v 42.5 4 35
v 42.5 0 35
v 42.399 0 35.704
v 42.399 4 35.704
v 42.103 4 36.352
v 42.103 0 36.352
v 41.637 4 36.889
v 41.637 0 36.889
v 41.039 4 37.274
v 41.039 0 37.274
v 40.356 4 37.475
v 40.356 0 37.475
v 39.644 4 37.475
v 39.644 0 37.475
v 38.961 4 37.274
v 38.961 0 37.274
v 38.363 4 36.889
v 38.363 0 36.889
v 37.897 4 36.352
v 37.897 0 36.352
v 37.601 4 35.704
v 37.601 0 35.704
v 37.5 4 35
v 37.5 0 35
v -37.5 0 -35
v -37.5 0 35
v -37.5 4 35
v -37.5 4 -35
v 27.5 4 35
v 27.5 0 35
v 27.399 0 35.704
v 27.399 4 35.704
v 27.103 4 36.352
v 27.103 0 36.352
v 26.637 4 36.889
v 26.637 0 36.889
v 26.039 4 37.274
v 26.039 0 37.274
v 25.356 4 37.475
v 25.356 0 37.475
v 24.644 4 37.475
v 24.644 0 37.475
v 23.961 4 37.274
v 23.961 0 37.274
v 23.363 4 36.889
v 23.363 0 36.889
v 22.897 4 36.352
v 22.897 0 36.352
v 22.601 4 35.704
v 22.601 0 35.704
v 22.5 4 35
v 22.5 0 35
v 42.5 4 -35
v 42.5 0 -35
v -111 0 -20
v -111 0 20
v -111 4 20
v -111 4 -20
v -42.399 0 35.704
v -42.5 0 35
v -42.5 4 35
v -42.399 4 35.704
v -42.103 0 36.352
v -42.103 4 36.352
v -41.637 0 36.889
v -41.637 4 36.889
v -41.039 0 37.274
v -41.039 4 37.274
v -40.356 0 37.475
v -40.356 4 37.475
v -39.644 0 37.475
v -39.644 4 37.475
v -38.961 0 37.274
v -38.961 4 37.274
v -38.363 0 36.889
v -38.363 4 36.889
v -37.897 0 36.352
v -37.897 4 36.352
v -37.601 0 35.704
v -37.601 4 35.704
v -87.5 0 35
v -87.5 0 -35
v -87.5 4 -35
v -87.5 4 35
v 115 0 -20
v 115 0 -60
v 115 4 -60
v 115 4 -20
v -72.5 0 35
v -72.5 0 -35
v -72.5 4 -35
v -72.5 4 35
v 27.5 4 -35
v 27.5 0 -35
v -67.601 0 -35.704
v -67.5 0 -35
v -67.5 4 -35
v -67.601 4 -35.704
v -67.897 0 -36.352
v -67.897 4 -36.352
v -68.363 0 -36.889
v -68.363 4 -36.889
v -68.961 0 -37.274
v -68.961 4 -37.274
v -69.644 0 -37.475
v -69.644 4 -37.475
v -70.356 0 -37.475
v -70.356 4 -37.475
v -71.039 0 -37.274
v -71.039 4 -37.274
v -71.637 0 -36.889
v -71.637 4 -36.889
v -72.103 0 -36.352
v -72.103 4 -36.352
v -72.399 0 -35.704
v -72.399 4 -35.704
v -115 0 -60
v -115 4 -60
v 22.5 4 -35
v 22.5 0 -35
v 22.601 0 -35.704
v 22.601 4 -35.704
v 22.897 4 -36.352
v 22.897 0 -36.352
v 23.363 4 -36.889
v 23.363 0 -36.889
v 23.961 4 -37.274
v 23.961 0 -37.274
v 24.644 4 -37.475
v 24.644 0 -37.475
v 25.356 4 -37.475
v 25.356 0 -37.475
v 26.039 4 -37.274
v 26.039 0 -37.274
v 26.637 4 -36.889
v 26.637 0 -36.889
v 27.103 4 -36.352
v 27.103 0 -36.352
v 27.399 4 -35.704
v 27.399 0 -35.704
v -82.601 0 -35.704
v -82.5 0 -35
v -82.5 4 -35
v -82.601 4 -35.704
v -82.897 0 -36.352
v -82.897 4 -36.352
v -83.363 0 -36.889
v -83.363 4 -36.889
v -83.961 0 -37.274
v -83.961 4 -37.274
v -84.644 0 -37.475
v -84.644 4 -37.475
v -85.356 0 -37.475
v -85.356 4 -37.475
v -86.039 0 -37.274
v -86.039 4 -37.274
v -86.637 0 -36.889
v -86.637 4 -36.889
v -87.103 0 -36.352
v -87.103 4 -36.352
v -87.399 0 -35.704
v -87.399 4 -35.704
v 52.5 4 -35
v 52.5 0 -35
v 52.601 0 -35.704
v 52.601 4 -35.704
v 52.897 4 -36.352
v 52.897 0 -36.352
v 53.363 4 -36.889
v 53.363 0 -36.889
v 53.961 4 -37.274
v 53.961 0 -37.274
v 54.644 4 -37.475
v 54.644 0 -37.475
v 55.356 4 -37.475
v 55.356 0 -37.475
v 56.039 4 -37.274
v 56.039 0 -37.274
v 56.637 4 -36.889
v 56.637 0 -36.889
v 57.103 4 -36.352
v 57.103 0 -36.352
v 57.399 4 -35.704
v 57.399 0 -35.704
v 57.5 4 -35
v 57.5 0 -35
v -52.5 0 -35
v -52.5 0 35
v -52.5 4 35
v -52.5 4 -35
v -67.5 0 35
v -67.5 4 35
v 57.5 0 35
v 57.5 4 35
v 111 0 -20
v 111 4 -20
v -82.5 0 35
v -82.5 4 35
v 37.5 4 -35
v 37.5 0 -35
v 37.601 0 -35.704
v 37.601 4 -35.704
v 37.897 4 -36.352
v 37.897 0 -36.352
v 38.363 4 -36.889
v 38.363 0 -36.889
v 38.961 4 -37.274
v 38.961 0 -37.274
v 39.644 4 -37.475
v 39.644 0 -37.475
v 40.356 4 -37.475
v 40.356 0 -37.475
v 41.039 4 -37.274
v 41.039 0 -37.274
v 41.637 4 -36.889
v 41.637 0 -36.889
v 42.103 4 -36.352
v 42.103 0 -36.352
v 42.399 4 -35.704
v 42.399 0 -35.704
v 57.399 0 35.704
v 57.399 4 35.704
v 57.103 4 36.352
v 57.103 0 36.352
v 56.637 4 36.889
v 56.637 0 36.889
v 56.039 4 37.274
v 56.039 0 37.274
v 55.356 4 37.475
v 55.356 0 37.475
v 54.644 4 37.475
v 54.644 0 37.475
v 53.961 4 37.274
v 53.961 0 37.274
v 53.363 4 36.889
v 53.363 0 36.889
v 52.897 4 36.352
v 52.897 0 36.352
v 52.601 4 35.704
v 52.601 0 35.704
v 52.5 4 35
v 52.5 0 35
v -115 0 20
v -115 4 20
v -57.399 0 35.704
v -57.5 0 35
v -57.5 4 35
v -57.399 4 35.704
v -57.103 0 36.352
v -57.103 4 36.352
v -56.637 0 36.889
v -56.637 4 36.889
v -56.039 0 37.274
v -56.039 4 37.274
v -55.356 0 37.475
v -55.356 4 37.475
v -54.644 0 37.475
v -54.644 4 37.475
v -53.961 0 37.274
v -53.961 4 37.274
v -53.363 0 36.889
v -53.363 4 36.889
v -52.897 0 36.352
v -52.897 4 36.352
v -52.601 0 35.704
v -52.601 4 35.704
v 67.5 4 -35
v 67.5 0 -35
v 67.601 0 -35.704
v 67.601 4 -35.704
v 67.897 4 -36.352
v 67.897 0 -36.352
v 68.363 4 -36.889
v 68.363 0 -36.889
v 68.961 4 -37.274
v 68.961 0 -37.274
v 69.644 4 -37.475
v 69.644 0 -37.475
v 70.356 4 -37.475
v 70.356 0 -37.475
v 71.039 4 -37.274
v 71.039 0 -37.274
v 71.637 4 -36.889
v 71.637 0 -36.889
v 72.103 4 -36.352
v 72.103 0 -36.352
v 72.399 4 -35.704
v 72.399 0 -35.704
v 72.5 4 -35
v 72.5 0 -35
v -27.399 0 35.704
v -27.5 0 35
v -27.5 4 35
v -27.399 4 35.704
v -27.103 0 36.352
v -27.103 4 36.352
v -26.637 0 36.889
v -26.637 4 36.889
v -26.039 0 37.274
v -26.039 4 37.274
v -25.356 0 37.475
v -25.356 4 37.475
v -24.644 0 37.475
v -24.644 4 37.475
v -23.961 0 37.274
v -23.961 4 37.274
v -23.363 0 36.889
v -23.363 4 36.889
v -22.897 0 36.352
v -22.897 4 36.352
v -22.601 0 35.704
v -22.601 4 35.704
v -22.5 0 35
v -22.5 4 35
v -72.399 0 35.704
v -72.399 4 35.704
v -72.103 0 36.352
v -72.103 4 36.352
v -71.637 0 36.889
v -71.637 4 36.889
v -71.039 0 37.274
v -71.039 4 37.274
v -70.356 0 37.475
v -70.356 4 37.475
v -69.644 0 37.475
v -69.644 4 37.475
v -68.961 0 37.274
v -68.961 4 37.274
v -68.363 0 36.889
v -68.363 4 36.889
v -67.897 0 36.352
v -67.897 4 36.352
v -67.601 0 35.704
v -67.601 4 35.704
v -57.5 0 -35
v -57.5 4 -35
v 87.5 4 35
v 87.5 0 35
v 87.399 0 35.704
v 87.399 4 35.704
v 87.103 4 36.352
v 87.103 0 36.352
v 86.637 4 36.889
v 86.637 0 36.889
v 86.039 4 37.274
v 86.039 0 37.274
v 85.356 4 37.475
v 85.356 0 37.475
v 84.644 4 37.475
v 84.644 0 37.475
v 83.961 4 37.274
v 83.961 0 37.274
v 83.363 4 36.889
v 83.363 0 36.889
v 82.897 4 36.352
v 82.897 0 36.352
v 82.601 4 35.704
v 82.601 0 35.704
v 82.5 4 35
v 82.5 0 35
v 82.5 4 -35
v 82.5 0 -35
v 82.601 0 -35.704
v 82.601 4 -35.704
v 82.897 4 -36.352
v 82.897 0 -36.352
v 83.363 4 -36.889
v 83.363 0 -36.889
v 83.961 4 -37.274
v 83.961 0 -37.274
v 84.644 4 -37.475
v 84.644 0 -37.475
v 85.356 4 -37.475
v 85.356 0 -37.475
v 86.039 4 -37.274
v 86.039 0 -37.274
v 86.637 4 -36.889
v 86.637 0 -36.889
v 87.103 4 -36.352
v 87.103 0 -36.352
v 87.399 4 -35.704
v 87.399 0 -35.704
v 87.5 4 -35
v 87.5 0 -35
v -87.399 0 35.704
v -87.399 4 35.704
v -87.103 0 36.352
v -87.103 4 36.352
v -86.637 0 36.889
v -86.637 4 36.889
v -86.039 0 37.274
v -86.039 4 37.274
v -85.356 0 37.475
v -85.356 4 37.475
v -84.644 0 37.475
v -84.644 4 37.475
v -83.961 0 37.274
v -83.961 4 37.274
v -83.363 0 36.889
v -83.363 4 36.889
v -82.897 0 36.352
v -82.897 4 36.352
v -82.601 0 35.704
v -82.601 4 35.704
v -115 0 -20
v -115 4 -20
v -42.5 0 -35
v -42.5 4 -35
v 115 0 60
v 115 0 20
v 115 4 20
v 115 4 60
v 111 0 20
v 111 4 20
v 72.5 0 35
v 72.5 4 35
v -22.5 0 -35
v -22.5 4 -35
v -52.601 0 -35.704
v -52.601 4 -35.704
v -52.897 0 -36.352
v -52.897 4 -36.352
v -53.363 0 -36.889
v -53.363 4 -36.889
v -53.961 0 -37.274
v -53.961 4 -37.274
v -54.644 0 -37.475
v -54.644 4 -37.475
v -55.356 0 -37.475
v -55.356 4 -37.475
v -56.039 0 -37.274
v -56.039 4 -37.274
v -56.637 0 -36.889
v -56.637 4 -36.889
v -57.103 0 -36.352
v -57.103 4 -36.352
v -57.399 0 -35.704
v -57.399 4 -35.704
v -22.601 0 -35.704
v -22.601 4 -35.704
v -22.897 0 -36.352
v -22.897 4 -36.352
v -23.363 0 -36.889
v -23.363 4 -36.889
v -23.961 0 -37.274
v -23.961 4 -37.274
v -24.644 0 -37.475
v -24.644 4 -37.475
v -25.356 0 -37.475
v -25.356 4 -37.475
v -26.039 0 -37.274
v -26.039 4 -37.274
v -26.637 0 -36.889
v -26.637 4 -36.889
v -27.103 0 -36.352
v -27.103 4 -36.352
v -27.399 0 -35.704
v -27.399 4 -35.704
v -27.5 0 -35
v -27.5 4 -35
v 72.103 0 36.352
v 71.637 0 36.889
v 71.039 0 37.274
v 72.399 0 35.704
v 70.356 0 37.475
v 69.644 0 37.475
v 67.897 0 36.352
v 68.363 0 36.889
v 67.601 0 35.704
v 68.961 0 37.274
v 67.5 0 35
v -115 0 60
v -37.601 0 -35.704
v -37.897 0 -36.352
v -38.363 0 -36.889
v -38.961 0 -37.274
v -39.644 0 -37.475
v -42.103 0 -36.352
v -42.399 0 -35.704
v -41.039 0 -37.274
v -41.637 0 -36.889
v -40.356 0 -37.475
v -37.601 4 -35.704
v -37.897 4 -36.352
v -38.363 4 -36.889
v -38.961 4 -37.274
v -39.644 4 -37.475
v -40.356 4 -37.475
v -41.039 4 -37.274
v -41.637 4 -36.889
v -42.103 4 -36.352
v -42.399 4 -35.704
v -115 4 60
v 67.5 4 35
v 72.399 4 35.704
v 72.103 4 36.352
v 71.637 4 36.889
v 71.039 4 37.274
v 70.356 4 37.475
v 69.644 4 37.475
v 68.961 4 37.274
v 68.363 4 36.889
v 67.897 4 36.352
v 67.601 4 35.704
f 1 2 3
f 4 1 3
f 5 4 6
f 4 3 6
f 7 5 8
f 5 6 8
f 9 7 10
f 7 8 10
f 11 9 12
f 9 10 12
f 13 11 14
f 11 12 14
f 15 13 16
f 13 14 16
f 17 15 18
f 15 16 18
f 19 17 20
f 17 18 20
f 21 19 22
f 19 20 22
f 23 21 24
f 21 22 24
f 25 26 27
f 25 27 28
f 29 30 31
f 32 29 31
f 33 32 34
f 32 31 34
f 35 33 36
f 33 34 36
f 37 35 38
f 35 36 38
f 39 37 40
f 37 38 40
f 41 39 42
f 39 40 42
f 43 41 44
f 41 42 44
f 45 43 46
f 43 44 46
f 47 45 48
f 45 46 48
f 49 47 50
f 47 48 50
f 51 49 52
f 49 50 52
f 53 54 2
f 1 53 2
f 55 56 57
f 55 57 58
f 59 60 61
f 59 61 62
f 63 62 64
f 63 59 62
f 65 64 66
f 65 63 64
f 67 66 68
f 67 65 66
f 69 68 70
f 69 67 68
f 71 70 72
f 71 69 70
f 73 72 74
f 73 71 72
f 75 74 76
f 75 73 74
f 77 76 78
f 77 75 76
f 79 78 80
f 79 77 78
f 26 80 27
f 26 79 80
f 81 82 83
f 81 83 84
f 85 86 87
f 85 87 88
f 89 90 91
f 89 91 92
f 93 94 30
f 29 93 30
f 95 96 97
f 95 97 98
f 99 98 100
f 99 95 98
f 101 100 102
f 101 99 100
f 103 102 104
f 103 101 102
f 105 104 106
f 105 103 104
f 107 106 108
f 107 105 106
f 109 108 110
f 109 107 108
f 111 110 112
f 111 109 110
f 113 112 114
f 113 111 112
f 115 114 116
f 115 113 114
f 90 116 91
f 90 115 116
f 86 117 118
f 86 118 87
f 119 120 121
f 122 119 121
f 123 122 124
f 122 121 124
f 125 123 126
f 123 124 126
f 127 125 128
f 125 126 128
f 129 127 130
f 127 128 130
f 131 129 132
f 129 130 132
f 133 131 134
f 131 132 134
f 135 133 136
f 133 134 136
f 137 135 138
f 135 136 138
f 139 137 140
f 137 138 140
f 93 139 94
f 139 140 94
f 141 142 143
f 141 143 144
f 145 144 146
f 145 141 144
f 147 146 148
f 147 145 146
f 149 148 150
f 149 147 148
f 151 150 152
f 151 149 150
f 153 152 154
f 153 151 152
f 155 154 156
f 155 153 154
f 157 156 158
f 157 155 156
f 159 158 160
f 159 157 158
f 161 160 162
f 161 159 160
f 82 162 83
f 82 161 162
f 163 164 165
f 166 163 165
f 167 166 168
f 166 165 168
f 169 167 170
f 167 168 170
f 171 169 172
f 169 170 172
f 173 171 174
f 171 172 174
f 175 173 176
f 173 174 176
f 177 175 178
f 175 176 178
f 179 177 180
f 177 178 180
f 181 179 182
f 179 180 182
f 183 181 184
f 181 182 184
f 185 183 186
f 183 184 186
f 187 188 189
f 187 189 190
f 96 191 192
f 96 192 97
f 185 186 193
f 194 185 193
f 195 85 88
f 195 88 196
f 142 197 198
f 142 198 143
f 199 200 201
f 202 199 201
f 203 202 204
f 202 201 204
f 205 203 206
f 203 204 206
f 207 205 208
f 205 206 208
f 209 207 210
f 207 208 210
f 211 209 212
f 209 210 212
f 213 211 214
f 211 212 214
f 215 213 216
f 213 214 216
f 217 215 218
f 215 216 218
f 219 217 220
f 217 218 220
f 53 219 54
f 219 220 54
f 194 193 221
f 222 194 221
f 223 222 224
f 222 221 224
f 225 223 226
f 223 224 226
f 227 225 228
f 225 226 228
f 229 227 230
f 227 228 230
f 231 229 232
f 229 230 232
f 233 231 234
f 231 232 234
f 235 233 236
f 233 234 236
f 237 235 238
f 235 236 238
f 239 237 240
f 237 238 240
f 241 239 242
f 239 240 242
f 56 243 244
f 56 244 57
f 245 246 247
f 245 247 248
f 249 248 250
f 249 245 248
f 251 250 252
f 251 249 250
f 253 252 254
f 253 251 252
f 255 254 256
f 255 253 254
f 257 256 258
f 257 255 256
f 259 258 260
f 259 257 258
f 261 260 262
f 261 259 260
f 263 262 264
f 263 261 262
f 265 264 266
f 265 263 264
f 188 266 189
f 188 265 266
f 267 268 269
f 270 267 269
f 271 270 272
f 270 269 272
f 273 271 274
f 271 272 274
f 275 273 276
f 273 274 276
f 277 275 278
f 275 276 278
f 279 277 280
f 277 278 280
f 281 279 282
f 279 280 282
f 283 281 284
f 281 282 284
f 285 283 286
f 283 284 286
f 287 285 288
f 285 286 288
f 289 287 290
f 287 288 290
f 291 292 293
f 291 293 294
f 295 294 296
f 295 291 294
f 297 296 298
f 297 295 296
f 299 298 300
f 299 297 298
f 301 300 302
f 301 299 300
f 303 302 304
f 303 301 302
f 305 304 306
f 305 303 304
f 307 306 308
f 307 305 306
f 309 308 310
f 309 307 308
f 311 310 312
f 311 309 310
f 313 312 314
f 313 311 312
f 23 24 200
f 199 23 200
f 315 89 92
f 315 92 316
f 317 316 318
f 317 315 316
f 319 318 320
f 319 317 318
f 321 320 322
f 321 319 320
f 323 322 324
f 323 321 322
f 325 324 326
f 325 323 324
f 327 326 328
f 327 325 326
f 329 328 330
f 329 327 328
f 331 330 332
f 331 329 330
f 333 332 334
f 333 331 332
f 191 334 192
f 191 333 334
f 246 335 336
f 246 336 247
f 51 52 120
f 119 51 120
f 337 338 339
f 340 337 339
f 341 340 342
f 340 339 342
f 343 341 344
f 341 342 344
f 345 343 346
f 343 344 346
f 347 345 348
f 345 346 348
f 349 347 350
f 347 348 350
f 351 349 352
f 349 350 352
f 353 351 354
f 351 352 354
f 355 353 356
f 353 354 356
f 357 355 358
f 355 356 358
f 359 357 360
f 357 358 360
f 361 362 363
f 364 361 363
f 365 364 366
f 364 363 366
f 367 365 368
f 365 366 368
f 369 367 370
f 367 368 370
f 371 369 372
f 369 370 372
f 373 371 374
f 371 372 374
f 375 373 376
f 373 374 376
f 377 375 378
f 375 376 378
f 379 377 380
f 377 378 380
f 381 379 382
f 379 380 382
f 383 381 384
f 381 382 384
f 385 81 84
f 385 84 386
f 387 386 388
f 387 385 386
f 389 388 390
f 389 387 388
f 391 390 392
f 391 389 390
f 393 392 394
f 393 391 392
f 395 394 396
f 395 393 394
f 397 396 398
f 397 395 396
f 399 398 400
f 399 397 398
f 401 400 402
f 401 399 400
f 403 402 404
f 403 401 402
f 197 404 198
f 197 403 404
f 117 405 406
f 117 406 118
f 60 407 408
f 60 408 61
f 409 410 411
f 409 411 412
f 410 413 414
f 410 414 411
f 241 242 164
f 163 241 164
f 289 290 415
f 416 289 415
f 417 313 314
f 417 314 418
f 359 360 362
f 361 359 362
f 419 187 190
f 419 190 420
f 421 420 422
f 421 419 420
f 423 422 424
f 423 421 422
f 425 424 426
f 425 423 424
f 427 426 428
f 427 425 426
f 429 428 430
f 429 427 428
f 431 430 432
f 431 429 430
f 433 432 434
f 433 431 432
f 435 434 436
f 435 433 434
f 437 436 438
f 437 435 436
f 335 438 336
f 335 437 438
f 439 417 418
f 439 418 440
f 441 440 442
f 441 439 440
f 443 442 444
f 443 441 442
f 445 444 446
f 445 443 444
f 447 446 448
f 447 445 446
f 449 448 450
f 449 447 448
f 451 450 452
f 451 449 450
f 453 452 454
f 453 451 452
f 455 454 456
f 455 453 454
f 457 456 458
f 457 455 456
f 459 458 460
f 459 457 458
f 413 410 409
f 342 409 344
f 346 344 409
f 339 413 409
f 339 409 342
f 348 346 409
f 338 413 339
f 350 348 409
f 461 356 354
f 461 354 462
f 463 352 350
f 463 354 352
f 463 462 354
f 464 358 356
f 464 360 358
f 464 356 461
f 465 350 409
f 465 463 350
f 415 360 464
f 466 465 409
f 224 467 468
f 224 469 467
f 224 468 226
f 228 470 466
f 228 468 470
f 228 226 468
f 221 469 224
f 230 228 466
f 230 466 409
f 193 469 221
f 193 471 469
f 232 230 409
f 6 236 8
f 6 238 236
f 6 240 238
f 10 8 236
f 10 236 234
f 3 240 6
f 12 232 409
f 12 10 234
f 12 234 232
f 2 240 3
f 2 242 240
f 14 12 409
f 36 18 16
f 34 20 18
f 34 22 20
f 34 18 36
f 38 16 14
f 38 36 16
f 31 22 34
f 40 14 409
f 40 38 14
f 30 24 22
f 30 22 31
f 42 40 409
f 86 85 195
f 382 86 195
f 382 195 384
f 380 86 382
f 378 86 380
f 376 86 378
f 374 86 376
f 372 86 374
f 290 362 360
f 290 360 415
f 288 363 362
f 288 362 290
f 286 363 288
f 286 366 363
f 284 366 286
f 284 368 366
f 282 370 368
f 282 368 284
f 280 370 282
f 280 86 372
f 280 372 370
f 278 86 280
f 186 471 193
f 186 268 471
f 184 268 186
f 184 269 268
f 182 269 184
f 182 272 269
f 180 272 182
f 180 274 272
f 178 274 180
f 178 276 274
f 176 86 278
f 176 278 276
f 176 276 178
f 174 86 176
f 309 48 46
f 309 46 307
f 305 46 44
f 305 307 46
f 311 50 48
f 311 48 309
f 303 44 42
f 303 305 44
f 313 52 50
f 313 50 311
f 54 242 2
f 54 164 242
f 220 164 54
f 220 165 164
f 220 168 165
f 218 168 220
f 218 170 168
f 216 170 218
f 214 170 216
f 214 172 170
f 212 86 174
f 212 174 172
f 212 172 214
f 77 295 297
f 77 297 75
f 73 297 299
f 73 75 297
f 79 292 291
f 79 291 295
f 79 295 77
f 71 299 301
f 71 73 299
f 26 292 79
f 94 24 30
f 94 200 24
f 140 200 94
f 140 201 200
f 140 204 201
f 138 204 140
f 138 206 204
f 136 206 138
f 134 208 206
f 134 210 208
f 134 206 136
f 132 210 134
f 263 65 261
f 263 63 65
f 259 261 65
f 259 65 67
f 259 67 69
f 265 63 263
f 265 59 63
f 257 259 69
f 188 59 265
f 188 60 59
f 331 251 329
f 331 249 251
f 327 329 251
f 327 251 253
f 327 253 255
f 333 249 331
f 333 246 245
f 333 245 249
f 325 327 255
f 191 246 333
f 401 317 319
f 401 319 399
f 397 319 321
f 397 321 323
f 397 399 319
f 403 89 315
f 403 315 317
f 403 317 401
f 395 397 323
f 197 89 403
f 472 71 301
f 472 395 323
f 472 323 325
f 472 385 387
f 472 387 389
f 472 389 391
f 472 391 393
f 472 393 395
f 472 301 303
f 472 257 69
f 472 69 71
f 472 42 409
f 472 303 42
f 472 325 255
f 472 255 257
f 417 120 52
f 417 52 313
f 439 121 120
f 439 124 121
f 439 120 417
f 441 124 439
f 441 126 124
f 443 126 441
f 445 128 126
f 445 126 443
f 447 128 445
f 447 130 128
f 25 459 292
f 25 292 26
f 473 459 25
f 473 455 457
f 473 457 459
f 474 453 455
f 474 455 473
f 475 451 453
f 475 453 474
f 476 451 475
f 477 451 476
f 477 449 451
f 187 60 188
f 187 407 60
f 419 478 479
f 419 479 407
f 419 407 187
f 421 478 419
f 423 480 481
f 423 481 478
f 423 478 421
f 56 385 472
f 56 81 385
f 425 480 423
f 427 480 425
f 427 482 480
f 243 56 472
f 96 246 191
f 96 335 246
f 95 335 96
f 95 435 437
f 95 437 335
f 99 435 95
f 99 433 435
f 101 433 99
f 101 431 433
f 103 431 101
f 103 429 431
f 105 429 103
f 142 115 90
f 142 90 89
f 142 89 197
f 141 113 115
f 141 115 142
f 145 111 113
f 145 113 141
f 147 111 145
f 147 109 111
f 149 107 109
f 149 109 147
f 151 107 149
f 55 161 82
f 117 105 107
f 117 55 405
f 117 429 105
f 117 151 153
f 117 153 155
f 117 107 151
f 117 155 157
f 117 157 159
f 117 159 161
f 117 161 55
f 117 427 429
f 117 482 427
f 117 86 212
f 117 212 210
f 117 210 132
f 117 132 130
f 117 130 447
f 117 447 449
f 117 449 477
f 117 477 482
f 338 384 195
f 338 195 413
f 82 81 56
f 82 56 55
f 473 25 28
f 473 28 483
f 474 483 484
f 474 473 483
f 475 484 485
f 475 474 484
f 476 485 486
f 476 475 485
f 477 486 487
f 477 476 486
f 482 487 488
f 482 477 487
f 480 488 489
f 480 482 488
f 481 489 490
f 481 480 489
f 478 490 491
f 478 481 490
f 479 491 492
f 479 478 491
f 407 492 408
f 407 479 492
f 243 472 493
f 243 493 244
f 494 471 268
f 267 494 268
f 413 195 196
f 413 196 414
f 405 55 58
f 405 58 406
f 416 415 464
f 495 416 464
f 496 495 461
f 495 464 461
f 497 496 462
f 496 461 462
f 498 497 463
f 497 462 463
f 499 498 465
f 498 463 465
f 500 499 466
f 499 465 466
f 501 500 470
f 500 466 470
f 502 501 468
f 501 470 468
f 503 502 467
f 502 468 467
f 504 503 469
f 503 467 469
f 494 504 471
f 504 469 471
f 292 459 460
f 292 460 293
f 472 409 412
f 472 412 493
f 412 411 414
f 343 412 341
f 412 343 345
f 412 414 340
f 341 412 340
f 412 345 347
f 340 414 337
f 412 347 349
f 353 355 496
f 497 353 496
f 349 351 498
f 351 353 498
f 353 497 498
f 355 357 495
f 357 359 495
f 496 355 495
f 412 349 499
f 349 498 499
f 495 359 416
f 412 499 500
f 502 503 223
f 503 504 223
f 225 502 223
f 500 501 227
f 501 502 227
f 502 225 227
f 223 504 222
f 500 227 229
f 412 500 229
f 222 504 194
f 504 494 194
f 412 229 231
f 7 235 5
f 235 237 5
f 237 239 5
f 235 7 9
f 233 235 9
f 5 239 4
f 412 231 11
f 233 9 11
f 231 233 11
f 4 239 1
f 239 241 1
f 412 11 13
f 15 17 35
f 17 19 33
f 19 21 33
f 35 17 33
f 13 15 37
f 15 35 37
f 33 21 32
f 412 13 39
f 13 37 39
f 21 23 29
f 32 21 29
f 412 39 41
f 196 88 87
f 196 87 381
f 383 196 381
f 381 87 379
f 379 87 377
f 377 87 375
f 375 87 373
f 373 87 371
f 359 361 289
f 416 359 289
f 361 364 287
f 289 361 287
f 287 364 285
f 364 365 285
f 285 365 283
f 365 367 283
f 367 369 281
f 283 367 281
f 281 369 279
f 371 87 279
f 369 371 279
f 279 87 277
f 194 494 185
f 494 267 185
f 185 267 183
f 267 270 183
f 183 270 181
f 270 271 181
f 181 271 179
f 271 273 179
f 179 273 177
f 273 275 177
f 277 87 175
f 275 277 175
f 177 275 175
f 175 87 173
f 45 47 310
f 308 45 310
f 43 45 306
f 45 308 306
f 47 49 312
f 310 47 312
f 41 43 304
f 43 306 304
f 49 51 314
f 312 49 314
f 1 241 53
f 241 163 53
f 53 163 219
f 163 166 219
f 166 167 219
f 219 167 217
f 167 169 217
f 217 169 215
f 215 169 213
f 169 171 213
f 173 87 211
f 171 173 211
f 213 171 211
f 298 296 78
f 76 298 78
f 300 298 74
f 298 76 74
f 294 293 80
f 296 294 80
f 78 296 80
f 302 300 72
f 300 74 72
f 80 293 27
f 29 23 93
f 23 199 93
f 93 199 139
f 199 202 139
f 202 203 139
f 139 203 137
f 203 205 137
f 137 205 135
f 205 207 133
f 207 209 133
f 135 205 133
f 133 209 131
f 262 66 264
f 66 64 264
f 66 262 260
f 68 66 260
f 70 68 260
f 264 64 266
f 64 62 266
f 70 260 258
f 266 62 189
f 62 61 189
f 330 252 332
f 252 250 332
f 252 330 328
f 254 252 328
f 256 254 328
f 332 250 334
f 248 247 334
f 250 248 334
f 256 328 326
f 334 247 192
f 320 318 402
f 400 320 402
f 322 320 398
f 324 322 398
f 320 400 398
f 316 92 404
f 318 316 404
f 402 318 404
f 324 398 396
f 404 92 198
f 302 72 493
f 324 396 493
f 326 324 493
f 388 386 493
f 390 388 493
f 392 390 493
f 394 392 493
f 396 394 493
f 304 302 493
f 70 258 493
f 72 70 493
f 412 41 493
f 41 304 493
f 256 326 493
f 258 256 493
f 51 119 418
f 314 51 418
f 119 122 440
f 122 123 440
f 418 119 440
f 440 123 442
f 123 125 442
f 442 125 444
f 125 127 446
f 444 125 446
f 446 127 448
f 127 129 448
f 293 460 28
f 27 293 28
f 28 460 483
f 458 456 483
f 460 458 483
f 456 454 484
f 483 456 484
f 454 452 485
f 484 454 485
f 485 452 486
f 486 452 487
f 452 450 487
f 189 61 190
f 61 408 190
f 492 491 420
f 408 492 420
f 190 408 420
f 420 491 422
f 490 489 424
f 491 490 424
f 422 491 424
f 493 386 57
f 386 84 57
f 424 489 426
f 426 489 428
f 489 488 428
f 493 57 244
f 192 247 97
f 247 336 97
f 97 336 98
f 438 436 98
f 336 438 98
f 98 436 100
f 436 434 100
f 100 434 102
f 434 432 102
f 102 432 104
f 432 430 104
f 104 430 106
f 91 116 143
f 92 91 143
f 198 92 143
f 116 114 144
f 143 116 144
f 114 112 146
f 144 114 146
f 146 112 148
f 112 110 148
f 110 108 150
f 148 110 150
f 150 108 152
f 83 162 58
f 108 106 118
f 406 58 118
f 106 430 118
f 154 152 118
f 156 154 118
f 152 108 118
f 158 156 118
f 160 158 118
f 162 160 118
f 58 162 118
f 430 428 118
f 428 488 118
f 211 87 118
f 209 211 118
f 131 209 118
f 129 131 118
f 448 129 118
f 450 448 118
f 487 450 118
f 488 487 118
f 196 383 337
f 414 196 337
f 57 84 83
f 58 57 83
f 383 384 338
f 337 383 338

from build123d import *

# Parameters (mm, degrees)
BOSS_EXTRUDE1_DEPTH = 4
CUT_EXTRUDE1_DEPTH  = 4


with BuildPart() as part:
    # Sketch1 → Boss-Extrude1 (new body)
    with BuildSketch(Plane(origin=(0, 0, 0), x_dir=(1, 0, 0), z_dir=(0, 1, 0))):
        Polygon((-115, 60), (115, 60), (115, 20), (111, 20), (111, -20), (115, -20), (115, -60), (-115, -60), (-115, -20), (-111, -20), (-111, 20), (-115, 20), align=None)
    extrude(amount=BOSS_EXTRUDE1_DEPTH)

    # Sketch2 → Cut-Extrude1 (cut)
    with BuildSketch(Plane.XZ):
        with BuildLine():
            Line((-87.5, -35), (-87.5, 35))
            ThreePointArc((-87.5, 35), (-85, 37.5), (-82.5, 35))
            Line((-82.5, 35), (-82.5, -35))
            ThreePointArc((-82.5, -35), (-85, -37.5), (-87.5, -35))
        make_face()
        with BuildLine():
            Line((-72.5, -35), (-72.5, 35))
            ThreePointArc((-72.5, 35), (-70, 37.5), (-67.5, 35))
            Line((-67.5, 35), (-67.5, -35))
            ThreePointArc((-67.5, -35), (-70, -37.5), (-72.5, -35))
        make_face()
        with BuildLine():
            Line((-57.5, -35), (-57.5, 35))
            ThreePointArc((-57.5, 35), (-55, 37.5), (-52.5, 35))
            Line((-52.5, 35), (-52.5, -35))
            ThreePointArc((-52.5, -35), (-55, -37.5), (-57.5, -35))
        make_face()
        with BuildLine():
            Line((-42.5, -35), (-42.5, 35))
            ThreePointArc((-42.5, 35), (-40, 37.5), (-37.5, 35))
            Line((-37.5, 35), (-37.5, -35))
            ThreePointArc((-37.5, -35), (-40, -37.5), (-42.5, -35))
        make_face()
        with BuildLine():
            Line((-27.5, -35), (-27.5, 35))
            ThreePointArc((-27.5, 35), (-25, 37.5), (-22.5, 35))
            Line((-22.5, 35), (-22.5, -35))
            ThreePointArc((-22.5, -35), (-25, -37.5), (-27.5, -35))
        make_face()
        with BuildLine():
            Line((87.5, -35), (87.5, 35))
            ThreePointArc((87.5, 35), (85, 37.5), (82.5, 35))
            Line((82.5, 35), (82.5, -35))
            ThreePointArc((82.5, -35), (85, -37.5), (87.5, -35))
        make_face()
        with BuildLine():
            Line((72.5, -35), (72.5, 35))
            ThreePointArc((72.5, 35), (70, 37.5), (67.5, 35))
            Line((67.5, 35), (67.5, -35))
            ThreePointArc((67.5, -35), (70, -37.5), (72.5, -35))
        make_face()
        with BuildLine():
            Line((57.5, -35), (57.5, 35))
            ThreePointArc((57.5, 35), (55, 37.5), (52.5, 35))
            Line((52.5, 35), (52.5, -35))
            ThreePointArc((52.5, -35), (55, -37.5), (57.5, -35))
        make_face()
        with BuildLine():
            Line((42.5, -35), (42.5, 35))
            ThreePointArc((42.5, 35), (40, 37.5), (37.5, 35))
            Line((37.5, 35), (37.5, -35))
            ThreePointArc((37.5, -35), (40, -37.5), (42.5, -35))
        make_face()
        with BuildLine():
            Line((27.5, -35), (27.5, 35))
            ThreePointArc((27.5, 35), (25, 37.5), (22.5, 35))
            Line((22.5, 35), (22.5, -35))
            ThreePointArc((22.5, -35), (25, -37.5), (27.5, -35))
        make_face()
    extrude(amount=-CUT_EXTRUDE1_DEPTH, mode=Mode.SUBTRACT)


solid = part.part
